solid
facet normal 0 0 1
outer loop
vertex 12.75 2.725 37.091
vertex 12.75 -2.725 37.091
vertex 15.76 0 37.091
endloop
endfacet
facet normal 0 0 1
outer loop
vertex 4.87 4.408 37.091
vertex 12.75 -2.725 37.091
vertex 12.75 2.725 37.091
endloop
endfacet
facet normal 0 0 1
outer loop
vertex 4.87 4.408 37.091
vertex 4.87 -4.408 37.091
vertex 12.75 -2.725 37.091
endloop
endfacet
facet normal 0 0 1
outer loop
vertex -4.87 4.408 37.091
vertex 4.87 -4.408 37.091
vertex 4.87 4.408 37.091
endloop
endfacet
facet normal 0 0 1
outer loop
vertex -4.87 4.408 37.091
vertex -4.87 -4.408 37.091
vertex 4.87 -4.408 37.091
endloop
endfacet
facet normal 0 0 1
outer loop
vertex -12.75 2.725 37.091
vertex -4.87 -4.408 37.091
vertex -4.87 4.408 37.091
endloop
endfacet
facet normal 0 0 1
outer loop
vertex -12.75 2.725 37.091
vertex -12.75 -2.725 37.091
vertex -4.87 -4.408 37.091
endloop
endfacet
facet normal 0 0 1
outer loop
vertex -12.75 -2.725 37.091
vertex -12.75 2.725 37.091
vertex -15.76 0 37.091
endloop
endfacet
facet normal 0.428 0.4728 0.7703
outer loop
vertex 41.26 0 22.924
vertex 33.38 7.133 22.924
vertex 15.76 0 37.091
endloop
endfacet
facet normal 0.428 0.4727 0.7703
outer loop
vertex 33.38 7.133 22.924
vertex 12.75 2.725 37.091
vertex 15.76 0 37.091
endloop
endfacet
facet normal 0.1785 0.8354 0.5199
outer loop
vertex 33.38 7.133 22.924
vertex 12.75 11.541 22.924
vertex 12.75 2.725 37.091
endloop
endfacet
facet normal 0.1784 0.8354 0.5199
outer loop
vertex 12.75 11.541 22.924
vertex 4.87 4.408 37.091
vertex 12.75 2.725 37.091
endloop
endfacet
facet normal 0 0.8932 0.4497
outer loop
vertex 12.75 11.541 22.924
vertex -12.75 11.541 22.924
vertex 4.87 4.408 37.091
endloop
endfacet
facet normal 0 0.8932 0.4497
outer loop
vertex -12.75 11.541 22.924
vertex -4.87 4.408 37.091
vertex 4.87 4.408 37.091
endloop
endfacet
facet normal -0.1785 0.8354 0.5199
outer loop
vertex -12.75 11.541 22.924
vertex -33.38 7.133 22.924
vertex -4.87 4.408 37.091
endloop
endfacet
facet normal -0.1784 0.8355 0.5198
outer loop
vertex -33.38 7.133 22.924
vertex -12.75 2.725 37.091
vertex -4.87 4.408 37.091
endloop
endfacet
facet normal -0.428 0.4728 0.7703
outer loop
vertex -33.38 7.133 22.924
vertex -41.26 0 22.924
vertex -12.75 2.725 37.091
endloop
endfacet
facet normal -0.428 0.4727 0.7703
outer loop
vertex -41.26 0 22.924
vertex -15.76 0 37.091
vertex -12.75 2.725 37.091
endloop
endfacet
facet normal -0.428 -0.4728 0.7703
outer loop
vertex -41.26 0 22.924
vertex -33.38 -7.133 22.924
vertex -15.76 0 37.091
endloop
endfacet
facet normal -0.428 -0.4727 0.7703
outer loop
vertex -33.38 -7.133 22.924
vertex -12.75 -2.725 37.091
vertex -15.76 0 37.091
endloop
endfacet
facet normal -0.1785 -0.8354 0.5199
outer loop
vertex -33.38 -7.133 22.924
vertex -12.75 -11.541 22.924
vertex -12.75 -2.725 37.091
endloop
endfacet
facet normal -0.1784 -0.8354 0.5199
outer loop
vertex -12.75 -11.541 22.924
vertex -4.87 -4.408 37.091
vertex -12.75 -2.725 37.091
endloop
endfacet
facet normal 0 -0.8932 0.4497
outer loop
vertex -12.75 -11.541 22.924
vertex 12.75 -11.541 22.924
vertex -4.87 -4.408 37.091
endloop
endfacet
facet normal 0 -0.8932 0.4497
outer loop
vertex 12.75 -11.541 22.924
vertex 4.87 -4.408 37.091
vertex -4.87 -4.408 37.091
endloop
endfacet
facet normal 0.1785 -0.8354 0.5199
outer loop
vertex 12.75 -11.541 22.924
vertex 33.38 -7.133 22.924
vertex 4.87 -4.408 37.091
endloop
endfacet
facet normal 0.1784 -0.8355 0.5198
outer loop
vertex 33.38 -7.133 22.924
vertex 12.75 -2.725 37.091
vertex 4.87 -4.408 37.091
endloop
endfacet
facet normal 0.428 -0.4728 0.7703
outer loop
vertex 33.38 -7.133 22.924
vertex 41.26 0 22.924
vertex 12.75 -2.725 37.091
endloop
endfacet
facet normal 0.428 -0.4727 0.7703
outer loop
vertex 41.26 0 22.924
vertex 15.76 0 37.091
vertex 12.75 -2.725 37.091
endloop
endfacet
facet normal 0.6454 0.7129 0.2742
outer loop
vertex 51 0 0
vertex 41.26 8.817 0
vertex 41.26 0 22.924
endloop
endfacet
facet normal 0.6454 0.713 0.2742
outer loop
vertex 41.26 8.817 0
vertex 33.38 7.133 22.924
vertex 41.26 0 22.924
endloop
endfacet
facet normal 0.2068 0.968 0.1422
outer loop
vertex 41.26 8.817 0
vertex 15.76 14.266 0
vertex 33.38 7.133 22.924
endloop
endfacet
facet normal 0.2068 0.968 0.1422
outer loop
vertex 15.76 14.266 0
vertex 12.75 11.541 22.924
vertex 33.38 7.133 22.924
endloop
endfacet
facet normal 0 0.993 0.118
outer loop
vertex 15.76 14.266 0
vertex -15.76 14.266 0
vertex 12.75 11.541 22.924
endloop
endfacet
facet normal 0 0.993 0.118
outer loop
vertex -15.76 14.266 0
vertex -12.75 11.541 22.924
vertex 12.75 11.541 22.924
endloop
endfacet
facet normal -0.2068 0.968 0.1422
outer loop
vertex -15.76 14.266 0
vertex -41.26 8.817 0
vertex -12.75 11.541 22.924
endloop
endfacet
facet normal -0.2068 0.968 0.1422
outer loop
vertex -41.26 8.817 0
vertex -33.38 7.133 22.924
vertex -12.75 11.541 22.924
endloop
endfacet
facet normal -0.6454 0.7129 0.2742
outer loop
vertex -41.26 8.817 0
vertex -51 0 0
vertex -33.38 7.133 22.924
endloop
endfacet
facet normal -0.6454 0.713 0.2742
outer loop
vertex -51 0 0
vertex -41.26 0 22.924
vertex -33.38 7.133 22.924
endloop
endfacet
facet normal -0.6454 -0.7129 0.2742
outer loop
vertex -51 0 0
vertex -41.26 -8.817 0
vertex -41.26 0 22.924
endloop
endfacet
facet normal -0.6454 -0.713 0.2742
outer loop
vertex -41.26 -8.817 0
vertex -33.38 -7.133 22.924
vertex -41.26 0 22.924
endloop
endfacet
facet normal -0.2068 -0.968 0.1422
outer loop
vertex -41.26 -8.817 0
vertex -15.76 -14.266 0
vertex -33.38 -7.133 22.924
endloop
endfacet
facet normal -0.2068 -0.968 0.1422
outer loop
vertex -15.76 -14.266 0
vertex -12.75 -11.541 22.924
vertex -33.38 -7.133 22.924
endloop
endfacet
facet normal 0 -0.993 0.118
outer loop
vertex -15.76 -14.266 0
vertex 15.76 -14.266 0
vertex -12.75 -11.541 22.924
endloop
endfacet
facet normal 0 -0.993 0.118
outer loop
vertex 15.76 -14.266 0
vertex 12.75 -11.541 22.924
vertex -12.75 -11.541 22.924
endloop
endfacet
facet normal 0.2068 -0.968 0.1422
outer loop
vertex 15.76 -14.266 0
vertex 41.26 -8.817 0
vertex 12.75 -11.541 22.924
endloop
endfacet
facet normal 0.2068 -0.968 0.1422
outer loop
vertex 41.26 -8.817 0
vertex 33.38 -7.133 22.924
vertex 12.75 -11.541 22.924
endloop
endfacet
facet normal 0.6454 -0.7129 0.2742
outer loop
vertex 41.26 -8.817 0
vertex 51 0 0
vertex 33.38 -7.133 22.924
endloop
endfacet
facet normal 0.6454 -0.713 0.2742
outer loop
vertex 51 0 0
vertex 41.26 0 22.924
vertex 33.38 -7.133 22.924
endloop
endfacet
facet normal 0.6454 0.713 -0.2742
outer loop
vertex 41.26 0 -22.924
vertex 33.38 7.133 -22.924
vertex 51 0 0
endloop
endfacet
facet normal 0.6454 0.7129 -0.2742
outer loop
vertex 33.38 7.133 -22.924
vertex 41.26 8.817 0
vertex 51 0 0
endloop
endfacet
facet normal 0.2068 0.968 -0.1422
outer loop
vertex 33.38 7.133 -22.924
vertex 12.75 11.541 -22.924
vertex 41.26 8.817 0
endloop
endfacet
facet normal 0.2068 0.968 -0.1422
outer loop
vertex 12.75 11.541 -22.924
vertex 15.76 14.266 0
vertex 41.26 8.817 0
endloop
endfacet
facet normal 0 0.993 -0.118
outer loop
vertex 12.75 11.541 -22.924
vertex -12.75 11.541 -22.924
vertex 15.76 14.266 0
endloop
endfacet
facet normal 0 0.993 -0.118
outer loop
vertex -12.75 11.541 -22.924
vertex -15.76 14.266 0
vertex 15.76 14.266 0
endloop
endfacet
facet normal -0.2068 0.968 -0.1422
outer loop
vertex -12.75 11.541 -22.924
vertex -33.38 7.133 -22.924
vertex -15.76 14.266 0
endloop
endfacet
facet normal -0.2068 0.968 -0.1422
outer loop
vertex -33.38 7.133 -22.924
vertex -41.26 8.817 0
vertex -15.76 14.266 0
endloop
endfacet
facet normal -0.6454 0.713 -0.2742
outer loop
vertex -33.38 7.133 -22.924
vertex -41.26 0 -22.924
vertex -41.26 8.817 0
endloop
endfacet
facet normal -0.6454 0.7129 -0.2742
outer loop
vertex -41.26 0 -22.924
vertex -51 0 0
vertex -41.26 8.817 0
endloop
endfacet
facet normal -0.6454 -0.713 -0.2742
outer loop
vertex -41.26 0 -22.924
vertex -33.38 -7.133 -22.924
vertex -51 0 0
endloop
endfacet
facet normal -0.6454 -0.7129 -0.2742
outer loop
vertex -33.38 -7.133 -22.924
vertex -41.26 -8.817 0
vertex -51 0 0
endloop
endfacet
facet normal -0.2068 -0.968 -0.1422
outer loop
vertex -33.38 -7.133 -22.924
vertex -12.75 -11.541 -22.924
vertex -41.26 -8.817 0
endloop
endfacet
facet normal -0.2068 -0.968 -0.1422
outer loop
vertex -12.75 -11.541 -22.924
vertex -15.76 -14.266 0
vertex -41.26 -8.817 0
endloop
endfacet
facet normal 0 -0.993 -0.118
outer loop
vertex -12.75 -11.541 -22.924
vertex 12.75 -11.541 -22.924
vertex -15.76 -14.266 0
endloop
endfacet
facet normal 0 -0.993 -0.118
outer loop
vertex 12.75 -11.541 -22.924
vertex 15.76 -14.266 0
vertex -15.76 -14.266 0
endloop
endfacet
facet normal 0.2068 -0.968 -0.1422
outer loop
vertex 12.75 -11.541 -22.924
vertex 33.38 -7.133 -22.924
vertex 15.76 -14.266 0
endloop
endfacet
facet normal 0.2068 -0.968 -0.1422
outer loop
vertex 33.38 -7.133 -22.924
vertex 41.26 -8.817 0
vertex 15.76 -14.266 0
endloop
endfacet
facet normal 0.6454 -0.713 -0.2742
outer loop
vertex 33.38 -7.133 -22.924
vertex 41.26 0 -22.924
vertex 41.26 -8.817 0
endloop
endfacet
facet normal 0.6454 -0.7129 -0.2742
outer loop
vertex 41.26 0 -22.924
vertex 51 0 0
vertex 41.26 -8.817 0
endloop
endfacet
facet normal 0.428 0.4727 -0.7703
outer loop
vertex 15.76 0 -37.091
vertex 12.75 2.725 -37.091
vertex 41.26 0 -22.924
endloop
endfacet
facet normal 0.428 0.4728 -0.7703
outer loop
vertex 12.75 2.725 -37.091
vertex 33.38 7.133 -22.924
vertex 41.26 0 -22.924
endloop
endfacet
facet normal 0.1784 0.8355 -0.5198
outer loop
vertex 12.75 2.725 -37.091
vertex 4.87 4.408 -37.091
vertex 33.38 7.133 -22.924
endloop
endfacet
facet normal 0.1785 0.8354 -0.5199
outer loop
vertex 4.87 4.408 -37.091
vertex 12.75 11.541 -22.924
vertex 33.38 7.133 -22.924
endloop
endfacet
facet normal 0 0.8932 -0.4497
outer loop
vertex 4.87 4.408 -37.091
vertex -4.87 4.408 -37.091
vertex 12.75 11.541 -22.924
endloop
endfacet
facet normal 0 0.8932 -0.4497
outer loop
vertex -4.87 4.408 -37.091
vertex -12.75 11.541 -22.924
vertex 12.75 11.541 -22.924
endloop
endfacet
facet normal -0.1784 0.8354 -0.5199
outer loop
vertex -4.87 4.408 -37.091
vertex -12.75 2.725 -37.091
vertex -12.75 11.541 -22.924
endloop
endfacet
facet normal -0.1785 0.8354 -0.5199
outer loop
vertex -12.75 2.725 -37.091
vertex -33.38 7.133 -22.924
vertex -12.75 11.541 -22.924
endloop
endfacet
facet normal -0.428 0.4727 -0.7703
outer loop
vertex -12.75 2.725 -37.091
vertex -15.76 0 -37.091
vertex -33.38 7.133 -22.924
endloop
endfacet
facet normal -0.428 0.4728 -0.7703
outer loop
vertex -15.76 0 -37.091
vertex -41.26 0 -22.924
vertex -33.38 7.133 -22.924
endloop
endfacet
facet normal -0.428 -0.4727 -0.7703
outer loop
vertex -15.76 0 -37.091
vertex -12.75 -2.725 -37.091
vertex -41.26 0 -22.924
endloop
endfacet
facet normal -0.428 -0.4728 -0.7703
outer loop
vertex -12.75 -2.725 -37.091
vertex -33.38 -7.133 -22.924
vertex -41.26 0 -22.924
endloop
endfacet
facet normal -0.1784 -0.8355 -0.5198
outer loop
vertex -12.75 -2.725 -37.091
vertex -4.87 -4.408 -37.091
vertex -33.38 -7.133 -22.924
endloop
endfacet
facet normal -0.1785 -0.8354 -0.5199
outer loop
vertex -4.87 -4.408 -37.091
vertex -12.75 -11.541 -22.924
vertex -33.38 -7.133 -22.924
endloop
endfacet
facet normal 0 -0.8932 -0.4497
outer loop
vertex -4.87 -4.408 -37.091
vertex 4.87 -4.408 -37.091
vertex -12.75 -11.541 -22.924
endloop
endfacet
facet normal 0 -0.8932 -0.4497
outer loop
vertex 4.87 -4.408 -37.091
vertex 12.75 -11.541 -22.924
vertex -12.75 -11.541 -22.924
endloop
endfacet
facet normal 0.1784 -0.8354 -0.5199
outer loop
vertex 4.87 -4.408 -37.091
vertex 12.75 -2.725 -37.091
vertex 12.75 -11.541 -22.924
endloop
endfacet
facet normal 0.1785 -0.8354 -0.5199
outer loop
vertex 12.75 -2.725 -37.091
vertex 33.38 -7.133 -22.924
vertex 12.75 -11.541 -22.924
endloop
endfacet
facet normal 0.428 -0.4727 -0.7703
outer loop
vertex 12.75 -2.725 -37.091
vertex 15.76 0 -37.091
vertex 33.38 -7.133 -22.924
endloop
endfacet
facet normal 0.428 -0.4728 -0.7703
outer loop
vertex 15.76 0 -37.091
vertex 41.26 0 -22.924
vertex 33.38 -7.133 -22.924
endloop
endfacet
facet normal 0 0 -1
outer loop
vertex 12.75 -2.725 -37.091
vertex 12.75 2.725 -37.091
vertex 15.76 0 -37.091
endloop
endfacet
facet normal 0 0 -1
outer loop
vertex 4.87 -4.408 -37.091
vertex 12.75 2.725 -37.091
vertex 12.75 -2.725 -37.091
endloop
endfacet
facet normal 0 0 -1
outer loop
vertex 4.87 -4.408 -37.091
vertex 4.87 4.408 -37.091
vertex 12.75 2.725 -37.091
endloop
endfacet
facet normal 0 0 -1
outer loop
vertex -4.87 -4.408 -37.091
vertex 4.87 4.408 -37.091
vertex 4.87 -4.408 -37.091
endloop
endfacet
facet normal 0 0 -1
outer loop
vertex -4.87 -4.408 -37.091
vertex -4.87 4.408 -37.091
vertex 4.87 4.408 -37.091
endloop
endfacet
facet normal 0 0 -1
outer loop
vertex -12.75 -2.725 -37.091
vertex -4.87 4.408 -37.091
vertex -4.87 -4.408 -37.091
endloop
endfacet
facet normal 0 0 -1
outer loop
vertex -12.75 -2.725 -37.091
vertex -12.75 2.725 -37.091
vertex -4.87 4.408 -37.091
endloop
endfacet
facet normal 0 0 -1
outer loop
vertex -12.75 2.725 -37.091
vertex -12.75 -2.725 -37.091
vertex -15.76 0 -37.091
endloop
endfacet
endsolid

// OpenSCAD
// Generated by SolidPython 1.0.1 on 2020-07-29 00:46:52


scale(v = [17, 5, 13]) {
	sphere(r = 3);
}
/***********************************************
*********      SolidPython code:      **********
************************************************
 
# import packages: SolidPython
from solid import *
from solid.utils import *
from itertools import chain, combinations, permutations


class Resize:

    def __init__(self, scad_file):
        self.scad_file = scad_file
        #self.scad_file = import_scad(scad_file)
        # cone/cylinder param:
        self.r1 = 0
        self.r2 = 0
        self.h = 0
        # rectangular prism param:
        self.w = 0
        self.l = 0
        # ellipse param:
        self.r = 0

    # import OpenScad code (file name corresponds to shape)


    # classify shape + parameters
    def assign(self, param1, param2, param3):
        if self.scad_file == 'cone.scad':
            self.r1 = param1
            self.r2 = param2
            self.h = param3
        elif self.scad_file == 'cylinder.scad':
            self.r1 = param1
            self.r2 = param2
            self.h = param3
        elif self.scad_file == 'rectangularPrism.scad':
            self.h = param1
            self.l = param2
            self.w = param3
        else:
            self.r = param1
            self.h = param2

    # resize parameters
    def iterate(self):
        x = range(3, 20, 2)
        i = 1
        if self.scad_file == 'cone.scad':
            tempList = list(permutations(x, 2))
            for temp in tempList:
                param1 = temp[0]
                param2 = temp[1]
                filepath = 'produced_scad_files/' + 'cone' + str(param1) + '_' + str(param2) + '_' + '.scad'
                scad_render_to_file(cylinder(h=param1, r1=param2, r2=0), filepath)

        elif self.scad_file == 'cylinder.scad':
            tempList = list(permutations(x, 3))
            for temp in tempList:
                param1 = temp[0]
                param2 = temp[1]
                filepath = 'produced_scad_files/' + 'cylinder' + str(param1) + '_' + str(param2) + '_' + '.scad'
                scad_render_to_file(cylinder(h=param1, r1=param2, r2=param2), filepath)

        elif self.scad_file == 'rectangularPrism.scad':
            tempList = list(permutations(x, 3))
            for temp in tempList:
                param1 = temp[0]
                param2 = temp[1]
                param3 = temp[2]
                filepath = 'produced_scad_files/' + 'rectangularPrism' + str(param1) + '_' + str(param2) + '_' + str(
                    param3) + '.scad'
                scad_render_to_file(cube(size=(param1, param2, param3)), filepath)

        elif self.scad_file == 'ellipse.scad':
            tempList = list(permutations(x, 4))
            for temp in tempList:
                param1 = temp[0]
                param2 = temp[1]
                param3 = temp[2]
                param4 = temp[3]
                filepath = 'produced_scad_files/' + 'ellipse' + str(param1) + '_' + str(param2) + '_' + str(param3) + '_' + str(param4) + '.scad'
                scad_render_to_file(scale([param1, param2, param3])(sphere(r=param4)), filepath)

    def render_to_scadfile(self):
        scad_render_to_file(scad, 'example.scad') 
 
************************************************/
